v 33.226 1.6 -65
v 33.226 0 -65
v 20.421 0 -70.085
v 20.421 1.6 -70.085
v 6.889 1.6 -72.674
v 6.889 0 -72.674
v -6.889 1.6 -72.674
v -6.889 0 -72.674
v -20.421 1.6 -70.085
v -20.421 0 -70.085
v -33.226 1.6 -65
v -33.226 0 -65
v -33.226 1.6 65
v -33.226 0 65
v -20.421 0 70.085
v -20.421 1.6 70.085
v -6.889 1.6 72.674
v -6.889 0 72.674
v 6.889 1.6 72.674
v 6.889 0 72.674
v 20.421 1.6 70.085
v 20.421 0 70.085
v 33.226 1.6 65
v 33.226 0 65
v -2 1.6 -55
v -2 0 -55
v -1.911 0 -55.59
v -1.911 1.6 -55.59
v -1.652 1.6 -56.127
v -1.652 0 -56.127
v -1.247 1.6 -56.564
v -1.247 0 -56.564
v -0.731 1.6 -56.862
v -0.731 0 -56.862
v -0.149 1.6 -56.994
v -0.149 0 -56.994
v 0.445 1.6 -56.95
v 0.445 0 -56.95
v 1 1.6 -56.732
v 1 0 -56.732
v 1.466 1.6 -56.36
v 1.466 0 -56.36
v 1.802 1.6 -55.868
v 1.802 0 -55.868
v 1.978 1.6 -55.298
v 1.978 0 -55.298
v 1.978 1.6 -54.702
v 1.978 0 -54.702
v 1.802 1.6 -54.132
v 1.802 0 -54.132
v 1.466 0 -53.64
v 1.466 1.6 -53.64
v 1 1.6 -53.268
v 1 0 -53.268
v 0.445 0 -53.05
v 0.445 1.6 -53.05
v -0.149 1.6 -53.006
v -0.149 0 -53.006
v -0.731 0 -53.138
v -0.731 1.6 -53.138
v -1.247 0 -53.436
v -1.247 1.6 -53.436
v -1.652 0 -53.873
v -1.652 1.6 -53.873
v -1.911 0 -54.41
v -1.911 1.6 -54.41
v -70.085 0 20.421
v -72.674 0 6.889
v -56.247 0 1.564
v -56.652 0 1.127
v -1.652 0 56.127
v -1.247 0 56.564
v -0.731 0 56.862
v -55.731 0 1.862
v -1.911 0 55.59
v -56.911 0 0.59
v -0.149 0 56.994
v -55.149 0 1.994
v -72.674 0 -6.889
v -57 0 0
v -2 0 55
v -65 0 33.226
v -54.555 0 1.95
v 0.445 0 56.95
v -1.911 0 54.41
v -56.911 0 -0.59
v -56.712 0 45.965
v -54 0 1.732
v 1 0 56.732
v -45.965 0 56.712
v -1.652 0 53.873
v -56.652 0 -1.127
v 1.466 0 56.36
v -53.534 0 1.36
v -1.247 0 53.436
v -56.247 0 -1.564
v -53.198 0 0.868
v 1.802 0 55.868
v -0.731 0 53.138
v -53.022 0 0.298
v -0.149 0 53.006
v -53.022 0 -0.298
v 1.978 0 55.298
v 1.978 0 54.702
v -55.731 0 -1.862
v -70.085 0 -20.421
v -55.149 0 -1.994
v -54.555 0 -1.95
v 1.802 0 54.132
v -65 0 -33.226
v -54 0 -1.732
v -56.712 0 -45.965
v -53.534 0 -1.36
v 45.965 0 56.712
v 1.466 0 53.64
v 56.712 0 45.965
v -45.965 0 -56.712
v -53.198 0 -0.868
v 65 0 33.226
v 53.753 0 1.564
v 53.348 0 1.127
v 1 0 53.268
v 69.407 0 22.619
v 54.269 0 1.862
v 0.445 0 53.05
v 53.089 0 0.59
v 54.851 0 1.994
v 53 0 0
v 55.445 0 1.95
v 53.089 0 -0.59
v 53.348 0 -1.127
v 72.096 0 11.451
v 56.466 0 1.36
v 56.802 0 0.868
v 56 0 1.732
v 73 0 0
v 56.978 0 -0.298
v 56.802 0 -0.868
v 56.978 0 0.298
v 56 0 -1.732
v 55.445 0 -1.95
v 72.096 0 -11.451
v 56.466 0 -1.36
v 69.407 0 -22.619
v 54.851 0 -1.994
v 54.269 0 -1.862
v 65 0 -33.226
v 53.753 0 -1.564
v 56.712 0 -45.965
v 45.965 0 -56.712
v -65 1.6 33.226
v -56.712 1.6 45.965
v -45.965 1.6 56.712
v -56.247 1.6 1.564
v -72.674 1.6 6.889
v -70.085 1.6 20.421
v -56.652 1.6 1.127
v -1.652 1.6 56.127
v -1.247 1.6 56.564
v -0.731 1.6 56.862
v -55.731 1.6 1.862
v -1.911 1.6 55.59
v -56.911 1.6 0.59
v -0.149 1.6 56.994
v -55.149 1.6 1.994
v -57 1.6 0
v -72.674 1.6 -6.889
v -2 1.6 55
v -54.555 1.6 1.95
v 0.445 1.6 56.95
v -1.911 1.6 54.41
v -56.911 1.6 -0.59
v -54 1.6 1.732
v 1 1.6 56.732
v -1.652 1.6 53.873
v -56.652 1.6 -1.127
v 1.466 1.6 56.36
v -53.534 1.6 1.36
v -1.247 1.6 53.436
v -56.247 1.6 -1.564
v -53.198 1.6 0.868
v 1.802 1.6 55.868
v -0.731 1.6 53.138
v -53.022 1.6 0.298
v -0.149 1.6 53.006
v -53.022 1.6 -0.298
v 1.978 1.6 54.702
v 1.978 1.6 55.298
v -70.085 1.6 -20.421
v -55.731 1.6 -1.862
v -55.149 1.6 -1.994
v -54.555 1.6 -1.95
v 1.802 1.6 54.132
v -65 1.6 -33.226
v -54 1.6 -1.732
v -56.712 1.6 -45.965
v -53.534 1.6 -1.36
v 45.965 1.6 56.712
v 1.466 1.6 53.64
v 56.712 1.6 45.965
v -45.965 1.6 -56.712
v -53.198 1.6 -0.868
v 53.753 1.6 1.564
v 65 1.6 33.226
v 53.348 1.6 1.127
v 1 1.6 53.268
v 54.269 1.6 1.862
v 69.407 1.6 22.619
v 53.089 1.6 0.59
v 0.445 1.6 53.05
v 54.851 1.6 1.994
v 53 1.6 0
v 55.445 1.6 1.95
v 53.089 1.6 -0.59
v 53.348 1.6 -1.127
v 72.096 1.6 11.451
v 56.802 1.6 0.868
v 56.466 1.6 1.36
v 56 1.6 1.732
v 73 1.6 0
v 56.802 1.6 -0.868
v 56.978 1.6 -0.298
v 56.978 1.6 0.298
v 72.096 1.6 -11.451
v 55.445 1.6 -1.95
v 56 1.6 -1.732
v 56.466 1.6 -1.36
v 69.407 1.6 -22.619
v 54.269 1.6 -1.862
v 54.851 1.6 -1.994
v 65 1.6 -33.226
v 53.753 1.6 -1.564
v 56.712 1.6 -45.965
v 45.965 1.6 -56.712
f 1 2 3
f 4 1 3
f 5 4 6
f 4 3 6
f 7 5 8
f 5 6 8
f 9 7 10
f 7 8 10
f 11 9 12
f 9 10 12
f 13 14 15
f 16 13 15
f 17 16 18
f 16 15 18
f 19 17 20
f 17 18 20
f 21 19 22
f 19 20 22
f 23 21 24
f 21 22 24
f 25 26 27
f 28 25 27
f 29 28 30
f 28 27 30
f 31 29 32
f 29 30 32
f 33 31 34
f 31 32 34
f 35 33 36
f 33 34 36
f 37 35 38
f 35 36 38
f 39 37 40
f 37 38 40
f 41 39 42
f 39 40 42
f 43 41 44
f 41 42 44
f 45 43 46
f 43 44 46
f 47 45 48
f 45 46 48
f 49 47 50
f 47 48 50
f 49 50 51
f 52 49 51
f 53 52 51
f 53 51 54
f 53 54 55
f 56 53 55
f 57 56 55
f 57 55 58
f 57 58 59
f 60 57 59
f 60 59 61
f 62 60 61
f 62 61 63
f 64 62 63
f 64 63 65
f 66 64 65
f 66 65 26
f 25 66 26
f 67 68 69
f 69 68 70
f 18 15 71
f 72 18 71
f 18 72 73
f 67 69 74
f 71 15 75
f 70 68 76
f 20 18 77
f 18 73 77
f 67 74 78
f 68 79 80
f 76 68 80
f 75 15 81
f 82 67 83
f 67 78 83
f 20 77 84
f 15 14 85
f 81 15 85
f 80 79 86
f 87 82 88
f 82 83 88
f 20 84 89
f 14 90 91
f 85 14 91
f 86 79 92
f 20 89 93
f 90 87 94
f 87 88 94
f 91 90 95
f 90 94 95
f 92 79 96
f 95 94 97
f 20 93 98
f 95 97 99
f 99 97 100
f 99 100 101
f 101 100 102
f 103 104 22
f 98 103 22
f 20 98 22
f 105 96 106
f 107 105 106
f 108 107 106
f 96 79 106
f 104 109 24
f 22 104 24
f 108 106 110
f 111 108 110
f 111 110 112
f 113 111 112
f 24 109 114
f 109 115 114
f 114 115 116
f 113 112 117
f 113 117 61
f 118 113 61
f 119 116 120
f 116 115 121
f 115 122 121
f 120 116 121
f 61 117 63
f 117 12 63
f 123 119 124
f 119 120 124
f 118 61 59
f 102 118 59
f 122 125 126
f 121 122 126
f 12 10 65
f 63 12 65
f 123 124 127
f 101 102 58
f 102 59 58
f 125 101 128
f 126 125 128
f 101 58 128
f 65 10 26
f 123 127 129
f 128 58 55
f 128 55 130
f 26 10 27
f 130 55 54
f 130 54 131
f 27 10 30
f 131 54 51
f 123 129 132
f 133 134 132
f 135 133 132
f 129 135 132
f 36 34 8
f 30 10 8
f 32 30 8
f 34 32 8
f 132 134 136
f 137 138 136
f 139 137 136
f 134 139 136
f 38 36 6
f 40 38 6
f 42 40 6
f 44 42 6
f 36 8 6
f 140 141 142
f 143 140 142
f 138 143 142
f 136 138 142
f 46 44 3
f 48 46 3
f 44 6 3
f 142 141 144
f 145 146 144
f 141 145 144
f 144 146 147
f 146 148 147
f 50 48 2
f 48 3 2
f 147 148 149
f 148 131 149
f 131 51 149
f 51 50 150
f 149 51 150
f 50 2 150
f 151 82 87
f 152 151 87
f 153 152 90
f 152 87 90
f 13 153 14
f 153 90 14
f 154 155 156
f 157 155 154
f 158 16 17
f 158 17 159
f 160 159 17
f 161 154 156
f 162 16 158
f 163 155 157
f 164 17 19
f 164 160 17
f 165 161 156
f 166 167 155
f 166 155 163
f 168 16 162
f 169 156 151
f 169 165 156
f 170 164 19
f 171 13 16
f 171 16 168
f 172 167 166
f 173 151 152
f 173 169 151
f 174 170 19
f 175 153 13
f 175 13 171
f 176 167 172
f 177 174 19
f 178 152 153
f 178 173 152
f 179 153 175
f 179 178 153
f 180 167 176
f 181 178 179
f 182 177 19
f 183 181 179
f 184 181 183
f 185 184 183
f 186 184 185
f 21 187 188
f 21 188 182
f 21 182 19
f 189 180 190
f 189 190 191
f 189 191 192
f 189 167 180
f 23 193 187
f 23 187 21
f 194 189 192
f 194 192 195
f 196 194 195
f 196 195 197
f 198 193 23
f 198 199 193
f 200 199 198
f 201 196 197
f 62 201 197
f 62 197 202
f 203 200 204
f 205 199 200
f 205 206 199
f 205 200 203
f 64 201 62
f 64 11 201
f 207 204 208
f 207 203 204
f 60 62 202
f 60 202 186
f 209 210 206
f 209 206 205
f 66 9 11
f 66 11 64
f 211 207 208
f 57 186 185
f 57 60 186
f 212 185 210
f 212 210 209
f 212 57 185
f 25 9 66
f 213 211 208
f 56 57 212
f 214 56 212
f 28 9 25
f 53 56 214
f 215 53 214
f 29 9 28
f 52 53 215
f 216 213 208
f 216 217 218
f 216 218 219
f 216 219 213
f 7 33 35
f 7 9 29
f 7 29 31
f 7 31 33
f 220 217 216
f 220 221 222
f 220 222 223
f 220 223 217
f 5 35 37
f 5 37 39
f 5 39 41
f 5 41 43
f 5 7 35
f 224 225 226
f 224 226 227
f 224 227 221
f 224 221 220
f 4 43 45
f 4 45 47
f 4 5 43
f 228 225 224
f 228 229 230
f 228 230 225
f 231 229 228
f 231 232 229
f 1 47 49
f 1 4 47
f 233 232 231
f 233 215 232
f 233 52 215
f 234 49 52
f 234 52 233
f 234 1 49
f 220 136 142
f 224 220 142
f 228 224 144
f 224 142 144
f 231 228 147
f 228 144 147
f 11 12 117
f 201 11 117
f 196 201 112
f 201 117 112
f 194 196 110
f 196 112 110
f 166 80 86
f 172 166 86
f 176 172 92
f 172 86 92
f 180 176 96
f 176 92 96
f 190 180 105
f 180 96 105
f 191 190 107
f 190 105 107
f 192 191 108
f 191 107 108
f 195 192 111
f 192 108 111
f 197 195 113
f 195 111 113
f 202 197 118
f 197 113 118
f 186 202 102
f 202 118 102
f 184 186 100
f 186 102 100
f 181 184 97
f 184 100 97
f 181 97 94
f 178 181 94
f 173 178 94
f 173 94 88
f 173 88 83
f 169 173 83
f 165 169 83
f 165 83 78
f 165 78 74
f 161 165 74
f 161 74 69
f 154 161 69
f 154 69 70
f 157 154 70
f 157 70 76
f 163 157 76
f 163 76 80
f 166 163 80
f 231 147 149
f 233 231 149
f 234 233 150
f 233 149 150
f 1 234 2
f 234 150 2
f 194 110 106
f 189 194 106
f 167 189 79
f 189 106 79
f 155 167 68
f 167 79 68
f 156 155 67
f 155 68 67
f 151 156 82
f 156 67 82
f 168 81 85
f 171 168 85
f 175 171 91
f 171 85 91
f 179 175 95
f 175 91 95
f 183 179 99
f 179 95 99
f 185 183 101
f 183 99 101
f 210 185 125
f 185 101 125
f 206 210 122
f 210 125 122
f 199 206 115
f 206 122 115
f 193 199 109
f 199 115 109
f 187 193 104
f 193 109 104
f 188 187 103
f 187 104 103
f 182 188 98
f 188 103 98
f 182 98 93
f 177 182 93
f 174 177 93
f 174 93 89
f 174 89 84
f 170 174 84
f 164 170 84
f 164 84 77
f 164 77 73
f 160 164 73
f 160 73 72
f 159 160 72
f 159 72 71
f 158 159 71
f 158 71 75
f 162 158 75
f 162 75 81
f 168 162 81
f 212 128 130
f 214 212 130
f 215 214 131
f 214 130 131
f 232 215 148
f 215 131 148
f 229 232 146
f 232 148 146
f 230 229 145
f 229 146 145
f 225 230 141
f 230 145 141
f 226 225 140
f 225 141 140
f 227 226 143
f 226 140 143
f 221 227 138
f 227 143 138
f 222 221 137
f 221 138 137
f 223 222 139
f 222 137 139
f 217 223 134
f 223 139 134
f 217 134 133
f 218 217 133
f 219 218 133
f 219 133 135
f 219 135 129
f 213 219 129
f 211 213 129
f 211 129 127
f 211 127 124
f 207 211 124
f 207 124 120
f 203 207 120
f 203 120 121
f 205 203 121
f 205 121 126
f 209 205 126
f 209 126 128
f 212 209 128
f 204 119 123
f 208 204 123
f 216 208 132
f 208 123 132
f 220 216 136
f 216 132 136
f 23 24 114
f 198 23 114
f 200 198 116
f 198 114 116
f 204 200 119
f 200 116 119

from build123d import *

# Parameters (mm, degrees)
BOSS_EXTRUDE1_DEPTH   = 1.6
F_4_0MM_DOWEL_HOLE1_D = 4


with BuildPart() as part:
    # Sketch1 → Boss-Extrude1 (new body)
    with BuildSketch(Plane(origin=(0, 0, 0), x_dir=(1, 0, 0), z_dir=(0, 1, 0))):
        with BuildLine():
            ThreePointArc((-65, 33.226495452), (-73, 0), (-65, -33.226495452))
            ThreePointArc((-65, -33.226495452), (-51.618795027, -51.618795027), (-33.226495452, -65))
            ThreePointArc((-33.226495452, -65), (0, -73), (33.226495452, -65))
            ThreePointArc((33.226495452, -65), (51.618795027, -51.618795027), (65, -33.226495452))
            ThreePointArc((65, -33.226495452), (70.971825396, -17.088007491), (73, 0))
            ThreePointArc((73, 0), (70.971825396, 17.088007491), (65, 33.226495452))
            ThreePointArc((65, 33.226495452), (51.618795027, 51.618795027), (33.226495452, 65))
            ThreePointArc((33.226495452, 65), (0, 73), (-33.226495452, 65))
            ThreePointArc((-33.226495452, 65), (-51.618795027, 51.618795027), (-65, 33.226495452))
        make_face()
    extrude(amount=BOSS_EXTRUDE1_DEPTH)

    # Ø4.0mm Dowel Hole1 (through all)
    with Locations(Plane(origin=(0, 1.6, 0), x_dir=(1, 0, 0), z_dir=(0, 1, 0))):
        with Locations((0, 55), (55, 0), (-55, 0), (0, -55)):
            Hole(F_4_0MM_DOWEL_HOLE1_D / 2)


solid = part.part
